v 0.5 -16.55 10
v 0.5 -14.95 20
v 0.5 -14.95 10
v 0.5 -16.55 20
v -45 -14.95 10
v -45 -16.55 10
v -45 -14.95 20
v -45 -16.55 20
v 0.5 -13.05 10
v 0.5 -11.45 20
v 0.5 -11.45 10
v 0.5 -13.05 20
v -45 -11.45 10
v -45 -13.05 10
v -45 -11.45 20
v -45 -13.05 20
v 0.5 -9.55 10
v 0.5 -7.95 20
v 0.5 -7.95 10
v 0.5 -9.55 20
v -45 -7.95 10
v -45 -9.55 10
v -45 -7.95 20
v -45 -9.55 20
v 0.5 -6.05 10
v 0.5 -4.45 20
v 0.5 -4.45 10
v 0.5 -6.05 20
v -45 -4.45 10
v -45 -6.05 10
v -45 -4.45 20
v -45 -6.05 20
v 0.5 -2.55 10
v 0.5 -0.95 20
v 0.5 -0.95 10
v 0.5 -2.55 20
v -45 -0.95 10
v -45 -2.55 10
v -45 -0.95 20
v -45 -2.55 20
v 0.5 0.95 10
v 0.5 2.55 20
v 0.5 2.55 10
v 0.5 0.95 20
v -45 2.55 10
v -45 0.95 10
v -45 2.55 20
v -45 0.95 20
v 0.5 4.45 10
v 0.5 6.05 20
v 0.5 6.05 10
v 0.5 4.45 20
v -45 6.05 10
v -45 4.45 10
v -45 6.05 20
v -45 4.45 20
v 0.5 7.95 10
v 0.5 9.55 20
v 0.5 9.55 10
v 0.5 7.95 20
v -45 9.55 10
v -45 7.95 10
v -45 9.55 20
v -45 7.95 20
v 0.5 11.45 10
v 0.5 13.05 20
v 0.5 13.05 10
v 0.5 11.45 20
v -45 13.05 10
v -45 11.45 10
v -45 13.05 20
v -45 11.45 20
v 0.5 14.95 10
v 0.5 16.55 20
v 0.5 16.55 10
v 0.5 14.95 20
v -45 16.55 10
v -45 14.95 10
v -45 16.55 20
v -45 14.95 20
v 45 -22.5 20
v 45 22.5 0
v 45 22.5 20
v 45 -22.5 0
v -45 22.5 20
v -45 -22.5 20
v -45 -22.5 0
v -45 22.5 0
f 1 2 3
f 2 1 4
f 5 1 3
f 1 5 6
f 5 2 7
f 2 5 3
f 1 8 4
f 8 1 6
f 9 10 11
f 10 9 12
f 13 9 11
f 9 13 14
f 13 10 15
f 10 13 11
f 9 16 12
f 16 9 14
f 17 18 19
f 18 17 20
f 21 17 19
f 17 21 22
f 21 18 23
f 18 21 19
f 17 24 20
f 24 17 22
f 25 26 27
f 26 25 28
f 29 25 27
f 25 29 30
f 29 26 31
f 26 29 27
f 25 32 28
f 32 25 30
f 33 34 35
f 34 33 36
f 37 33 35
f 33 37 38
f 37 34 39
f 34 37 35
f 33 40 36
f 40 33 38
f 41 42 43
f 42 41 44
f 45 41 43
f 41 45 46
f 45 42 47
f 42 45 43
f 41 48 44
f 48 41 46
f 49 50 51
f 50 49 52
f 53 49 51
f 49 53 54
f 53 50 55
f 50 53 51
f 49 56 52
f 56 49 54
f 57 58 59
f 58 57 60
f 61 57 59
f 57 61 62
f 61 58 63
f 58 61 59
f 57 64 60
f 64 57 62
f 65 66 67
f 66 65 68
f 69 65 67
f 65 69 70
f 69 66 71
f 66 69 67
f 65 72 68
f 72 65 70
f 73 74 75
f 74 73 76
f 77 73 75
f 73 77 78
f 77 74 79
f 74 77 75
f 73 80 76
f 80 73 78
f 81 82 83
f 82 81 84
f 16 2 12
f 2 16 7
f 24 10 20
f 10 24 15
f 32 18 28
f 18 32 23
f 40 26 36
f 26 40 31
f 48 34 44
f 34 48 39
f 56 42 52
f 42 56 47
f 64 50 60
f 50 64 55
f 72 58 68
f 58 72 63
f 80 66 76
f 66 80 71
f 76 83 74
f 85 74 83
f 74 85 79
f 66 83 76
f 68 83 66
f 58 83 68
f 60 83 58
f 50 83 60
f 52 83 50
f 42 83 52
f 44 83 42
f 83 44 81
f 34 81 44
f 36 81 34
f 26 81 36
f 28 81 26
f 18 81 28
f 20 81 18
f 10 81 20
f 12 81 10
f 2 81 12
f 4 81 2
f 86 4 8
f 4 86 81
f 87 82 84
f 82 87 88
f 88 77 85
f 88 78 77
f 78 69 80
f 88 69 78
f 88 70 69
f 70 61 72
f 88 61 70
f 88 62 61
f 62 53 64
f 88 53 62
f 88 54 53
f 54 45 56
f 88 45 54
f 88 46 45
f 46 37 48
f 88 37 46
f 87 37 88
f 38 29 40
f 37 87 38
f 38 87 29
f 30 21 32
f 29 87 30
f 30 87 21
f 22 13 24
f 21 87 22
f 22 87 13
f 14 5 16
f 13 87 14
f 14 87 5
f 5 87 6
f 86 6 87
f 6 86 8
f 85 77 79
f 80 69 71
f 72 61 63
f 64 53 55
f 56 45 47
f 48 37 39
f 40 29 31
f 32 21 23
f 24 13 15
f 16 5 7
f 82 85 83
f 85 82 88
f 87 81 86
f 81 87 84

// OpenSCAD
// Microscope slide drying rack
// Print orientation: base block on XY plane, slots open upward (+Z)

// ---------------- Parameters ----------------
block_len    = 90;    // block length along X (mm)
block_wid    = 45;    // block width along Y (mm)
block_ht     = 20;    // block height along Z (mm)

slot_count   = 10;    // number of slide slots
slot_len     = 77;    // slot length along X (mm)
slot_wid     = 1.6;   // slot width along Y (mm)
slot_depth   = 10;    // slot depth from top face (mm)
slot_pitch   = 3.5;   // centre-to-centre slot spacing in Y (mm)

eps          = 0.5;   // overcut so cutting faces are not coplanar (mm)

$fn = 64;

// ---------------- Derived ----------------
slot_x0 = -(slot_len / 2);              // first slot start in X
// Slot group is centred on the block in Y, so the first slot is at:
slot_y0 = -(slot_count - 1) * slot_pitch / 2;

// ---------------- Model ----------------
difference() {
    // Solid base block
    translate([-block_len / 2, -block_wid / 2, 0])
        cube([block_len, block_wid, block_ht]);

    // Parallel slots running along X, open at the top
    for (i = [0 : slot_count - 1])
        translate([slot_x0, slot_y0 + i * slot_pitch, block_ht - slot_depth])
            translate([-slot_len / 2 - eps, -slot_wid / 2, 0])
                cube([slot_len + 2 * eps, slot_wid, slot_depth + eps]);
}
